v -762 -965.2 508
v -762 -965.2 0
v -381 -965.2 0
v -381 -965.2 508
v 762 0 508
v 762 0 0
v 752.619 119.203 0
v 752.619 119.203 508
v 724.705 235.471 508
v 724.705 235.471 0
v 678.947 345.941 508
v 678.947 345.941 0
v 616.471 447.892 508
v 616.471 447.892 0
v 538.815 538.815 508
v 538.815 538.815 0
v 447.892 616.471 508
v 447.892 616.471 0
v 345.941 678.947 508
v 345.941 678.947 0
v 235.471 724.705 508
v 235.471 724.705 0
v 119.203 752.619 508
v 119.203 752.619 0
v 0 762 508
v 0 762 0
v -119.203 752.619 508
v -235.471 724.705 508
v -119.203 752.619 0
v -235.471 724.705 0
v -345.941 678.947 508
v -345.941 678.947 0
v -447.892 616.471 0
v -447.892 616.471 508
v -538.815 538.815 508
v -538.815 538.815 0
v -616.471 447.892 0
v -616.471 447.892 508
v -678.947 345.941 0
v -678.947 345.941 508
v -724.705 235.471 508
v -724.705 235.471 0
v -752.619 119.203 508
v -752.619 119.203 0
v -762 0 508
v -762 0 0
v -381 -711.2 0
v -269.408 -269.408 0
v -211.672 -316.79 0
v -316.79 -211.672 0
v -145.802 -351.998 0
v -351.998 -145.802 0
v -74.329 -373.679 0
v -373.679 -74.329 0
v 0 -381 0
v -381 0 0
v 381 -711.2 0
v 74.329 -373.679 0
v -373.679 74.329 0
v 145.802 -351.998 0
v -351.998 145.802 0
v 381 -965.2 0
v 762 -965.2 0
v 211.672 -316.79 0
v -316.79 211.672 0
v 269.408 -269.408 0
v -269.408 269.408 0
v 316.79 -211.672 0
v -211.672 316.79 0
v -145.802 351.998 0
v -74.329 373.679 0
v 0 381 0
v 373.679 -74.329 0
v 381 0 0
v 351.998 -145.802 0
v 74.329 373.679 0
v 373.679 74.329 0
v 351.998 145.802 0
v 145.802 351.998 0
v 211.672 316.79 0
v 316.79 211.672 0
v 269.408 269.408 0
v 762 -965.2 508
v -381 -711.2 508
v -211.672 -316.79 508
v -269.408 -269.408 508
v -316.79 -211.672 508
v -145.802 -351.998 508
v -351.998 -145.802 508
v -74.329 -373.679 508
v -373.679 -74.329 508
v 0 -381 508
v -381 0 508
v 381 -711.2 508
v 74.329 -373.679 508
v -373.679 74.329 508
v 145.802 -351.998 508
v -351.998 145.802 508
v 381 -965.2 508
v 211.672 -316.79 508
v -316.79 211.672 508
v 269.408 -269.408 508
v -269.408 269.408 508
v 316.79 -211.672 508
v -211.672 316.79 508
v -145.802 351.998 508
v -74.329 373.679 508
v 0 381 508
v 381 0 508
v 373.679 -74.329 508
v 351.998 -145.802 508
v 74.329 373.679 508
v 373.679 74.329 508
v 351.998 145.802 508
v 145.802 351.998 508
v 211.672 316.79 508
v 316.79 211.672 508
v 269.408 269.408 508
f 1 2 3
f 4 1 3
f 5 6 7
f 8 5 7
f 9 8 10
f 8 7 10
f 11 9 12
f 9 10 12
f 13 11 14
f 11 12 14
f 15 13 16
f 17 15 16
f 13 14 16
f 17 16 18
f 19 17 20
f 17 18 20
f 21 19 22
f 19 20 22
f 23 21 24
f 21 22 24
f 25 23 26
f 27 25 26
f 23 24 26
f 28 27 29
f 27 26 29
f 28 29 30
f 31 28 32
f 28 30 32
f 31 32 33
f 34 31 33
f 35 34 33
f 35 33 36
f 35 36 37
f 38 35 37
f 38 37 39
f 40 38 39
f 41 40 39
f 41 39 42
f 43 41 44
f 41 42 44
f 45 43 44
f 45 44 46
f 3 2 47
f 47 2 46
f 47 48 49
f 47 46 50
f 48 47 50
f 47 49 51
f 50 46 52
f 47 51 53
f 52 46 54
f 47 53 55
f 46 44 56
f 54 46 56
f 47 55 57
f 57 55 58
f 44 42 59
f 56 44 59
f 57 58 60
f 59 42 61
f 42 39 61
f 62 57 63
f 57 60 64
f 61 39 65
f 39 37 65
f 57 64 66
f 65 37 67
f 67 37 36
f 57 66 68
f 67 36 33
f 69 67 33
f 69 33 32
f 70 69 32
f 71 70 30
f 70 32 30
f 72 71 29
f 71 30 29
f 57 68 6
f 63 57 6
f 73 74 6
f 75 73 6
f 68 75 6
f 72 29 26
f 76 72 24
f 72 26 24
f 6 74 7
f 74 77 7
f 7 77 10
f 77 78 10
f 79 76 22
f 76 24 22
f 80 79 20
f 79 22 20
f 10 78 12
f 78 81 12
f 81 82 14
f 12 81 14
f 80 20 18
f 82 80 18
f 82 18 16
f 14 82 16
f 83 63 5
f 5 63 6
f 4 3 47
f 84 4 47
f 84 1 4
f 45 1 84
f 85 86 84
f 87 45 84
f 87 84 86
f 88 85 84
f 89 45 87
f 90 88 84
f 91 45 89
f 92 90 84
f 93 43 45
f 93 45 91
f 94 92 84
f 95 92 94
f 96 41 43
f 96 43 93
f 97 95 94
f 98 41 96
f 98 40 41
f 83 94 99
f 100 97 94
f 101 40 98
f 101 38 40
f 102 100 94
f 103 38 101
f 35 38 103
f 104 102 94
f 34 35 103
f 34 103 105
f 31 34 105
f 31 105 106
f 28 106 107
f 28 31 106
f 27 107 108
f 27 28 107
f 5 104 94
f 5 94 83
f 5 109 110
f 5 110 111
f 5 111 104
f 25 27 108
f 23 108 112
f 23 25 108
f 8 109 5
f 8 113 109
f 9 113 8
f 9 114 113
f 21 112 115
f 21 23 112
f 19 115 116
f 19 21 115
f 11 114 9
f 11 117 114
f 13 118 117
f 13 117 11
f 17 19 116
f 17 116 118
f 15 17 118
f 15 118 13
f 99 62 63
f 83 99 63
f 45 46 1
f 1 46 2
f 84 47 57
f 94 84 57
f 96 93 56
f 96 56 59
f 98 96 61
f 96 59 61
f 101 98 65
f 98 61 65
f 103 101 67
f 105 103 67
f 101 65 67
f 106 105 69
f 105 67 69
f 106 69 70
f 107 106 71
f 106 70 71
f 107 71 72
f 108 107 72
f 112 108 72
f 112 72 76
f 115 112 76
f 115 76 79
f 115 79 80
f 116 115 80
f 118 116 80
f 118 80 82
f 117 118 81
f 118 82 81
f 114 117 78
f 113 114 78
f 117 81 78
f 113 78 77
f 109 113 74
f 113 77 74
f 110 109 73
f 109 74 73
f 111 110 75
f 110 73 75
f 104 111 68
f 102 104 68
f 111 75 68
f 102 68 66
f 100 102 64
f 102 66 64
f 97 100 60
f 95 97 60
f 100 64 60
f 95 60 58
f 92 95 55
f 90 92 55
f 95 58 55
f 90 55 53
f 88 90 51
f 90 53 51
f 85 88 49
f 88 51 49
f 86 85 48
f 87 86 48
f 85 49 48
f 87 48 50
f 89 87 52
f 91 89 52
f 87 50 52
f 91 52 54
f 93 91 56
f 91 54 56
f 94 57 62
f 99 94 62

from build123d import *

# Parameters (mm, degrees)
F1_DEPTH = 508


with BuildPart() as f1:
    # F0 (on Top) → F1 (new body)
    with BuildSketch(Plane.XY):
        with BuildLine():
            Line((762, 0), (381, 0))
            ThreePointArc((381, 0), (0, -381), (-381, 0))
            Line((-381, 0), (-762, 0))
            ThreePointArc((-762, 0), (-628.132779, -431.385225), (-273.566372, -711.2))
            Line((-273.566372, -711.2), (273.566372, -711.2))
            ThreePointArc((273.566372, -711.2), (628.132779, -431.385225), (762, 0))
        make_face()
        with BuildLine():
            ThreePointArc((-273.566372, -711.2), (-628.132779, -431.385225), (-762, 0))
            Line((-762, 0), (-762, -965.2))
            Line((-762, -965.2), (-381, -965.2))
            Line((-381, -965.2), (-381, -711.2))
            Line((-381, -711.2), (-273.566372, -711.2))
        make_face()
        with BuildLine():
            Line((762, -965.2), (762, 0))
            ThreePointArc((762, 0), (628.132779, -431.385225), (273.566372, -711.2))
            Line((273.566372, -711.2), (381, -711.2))
            Line((381, -711.2), (381, -965.2))
            Line((381, -965.2), (762, -965.2))
        make_face()
        with BuildLine():
            ThreePointArc((-381, 0), (0, 381), (381, 0))
            Line((381, 0), (762, 0))
            ThreePointArc((762, 0), (0, 762), (-762, 0))
            Line((-762, 0), (-381, 0))
        make_face()
    extrude(amount=F1_DEPTH)


solid = f1.part
